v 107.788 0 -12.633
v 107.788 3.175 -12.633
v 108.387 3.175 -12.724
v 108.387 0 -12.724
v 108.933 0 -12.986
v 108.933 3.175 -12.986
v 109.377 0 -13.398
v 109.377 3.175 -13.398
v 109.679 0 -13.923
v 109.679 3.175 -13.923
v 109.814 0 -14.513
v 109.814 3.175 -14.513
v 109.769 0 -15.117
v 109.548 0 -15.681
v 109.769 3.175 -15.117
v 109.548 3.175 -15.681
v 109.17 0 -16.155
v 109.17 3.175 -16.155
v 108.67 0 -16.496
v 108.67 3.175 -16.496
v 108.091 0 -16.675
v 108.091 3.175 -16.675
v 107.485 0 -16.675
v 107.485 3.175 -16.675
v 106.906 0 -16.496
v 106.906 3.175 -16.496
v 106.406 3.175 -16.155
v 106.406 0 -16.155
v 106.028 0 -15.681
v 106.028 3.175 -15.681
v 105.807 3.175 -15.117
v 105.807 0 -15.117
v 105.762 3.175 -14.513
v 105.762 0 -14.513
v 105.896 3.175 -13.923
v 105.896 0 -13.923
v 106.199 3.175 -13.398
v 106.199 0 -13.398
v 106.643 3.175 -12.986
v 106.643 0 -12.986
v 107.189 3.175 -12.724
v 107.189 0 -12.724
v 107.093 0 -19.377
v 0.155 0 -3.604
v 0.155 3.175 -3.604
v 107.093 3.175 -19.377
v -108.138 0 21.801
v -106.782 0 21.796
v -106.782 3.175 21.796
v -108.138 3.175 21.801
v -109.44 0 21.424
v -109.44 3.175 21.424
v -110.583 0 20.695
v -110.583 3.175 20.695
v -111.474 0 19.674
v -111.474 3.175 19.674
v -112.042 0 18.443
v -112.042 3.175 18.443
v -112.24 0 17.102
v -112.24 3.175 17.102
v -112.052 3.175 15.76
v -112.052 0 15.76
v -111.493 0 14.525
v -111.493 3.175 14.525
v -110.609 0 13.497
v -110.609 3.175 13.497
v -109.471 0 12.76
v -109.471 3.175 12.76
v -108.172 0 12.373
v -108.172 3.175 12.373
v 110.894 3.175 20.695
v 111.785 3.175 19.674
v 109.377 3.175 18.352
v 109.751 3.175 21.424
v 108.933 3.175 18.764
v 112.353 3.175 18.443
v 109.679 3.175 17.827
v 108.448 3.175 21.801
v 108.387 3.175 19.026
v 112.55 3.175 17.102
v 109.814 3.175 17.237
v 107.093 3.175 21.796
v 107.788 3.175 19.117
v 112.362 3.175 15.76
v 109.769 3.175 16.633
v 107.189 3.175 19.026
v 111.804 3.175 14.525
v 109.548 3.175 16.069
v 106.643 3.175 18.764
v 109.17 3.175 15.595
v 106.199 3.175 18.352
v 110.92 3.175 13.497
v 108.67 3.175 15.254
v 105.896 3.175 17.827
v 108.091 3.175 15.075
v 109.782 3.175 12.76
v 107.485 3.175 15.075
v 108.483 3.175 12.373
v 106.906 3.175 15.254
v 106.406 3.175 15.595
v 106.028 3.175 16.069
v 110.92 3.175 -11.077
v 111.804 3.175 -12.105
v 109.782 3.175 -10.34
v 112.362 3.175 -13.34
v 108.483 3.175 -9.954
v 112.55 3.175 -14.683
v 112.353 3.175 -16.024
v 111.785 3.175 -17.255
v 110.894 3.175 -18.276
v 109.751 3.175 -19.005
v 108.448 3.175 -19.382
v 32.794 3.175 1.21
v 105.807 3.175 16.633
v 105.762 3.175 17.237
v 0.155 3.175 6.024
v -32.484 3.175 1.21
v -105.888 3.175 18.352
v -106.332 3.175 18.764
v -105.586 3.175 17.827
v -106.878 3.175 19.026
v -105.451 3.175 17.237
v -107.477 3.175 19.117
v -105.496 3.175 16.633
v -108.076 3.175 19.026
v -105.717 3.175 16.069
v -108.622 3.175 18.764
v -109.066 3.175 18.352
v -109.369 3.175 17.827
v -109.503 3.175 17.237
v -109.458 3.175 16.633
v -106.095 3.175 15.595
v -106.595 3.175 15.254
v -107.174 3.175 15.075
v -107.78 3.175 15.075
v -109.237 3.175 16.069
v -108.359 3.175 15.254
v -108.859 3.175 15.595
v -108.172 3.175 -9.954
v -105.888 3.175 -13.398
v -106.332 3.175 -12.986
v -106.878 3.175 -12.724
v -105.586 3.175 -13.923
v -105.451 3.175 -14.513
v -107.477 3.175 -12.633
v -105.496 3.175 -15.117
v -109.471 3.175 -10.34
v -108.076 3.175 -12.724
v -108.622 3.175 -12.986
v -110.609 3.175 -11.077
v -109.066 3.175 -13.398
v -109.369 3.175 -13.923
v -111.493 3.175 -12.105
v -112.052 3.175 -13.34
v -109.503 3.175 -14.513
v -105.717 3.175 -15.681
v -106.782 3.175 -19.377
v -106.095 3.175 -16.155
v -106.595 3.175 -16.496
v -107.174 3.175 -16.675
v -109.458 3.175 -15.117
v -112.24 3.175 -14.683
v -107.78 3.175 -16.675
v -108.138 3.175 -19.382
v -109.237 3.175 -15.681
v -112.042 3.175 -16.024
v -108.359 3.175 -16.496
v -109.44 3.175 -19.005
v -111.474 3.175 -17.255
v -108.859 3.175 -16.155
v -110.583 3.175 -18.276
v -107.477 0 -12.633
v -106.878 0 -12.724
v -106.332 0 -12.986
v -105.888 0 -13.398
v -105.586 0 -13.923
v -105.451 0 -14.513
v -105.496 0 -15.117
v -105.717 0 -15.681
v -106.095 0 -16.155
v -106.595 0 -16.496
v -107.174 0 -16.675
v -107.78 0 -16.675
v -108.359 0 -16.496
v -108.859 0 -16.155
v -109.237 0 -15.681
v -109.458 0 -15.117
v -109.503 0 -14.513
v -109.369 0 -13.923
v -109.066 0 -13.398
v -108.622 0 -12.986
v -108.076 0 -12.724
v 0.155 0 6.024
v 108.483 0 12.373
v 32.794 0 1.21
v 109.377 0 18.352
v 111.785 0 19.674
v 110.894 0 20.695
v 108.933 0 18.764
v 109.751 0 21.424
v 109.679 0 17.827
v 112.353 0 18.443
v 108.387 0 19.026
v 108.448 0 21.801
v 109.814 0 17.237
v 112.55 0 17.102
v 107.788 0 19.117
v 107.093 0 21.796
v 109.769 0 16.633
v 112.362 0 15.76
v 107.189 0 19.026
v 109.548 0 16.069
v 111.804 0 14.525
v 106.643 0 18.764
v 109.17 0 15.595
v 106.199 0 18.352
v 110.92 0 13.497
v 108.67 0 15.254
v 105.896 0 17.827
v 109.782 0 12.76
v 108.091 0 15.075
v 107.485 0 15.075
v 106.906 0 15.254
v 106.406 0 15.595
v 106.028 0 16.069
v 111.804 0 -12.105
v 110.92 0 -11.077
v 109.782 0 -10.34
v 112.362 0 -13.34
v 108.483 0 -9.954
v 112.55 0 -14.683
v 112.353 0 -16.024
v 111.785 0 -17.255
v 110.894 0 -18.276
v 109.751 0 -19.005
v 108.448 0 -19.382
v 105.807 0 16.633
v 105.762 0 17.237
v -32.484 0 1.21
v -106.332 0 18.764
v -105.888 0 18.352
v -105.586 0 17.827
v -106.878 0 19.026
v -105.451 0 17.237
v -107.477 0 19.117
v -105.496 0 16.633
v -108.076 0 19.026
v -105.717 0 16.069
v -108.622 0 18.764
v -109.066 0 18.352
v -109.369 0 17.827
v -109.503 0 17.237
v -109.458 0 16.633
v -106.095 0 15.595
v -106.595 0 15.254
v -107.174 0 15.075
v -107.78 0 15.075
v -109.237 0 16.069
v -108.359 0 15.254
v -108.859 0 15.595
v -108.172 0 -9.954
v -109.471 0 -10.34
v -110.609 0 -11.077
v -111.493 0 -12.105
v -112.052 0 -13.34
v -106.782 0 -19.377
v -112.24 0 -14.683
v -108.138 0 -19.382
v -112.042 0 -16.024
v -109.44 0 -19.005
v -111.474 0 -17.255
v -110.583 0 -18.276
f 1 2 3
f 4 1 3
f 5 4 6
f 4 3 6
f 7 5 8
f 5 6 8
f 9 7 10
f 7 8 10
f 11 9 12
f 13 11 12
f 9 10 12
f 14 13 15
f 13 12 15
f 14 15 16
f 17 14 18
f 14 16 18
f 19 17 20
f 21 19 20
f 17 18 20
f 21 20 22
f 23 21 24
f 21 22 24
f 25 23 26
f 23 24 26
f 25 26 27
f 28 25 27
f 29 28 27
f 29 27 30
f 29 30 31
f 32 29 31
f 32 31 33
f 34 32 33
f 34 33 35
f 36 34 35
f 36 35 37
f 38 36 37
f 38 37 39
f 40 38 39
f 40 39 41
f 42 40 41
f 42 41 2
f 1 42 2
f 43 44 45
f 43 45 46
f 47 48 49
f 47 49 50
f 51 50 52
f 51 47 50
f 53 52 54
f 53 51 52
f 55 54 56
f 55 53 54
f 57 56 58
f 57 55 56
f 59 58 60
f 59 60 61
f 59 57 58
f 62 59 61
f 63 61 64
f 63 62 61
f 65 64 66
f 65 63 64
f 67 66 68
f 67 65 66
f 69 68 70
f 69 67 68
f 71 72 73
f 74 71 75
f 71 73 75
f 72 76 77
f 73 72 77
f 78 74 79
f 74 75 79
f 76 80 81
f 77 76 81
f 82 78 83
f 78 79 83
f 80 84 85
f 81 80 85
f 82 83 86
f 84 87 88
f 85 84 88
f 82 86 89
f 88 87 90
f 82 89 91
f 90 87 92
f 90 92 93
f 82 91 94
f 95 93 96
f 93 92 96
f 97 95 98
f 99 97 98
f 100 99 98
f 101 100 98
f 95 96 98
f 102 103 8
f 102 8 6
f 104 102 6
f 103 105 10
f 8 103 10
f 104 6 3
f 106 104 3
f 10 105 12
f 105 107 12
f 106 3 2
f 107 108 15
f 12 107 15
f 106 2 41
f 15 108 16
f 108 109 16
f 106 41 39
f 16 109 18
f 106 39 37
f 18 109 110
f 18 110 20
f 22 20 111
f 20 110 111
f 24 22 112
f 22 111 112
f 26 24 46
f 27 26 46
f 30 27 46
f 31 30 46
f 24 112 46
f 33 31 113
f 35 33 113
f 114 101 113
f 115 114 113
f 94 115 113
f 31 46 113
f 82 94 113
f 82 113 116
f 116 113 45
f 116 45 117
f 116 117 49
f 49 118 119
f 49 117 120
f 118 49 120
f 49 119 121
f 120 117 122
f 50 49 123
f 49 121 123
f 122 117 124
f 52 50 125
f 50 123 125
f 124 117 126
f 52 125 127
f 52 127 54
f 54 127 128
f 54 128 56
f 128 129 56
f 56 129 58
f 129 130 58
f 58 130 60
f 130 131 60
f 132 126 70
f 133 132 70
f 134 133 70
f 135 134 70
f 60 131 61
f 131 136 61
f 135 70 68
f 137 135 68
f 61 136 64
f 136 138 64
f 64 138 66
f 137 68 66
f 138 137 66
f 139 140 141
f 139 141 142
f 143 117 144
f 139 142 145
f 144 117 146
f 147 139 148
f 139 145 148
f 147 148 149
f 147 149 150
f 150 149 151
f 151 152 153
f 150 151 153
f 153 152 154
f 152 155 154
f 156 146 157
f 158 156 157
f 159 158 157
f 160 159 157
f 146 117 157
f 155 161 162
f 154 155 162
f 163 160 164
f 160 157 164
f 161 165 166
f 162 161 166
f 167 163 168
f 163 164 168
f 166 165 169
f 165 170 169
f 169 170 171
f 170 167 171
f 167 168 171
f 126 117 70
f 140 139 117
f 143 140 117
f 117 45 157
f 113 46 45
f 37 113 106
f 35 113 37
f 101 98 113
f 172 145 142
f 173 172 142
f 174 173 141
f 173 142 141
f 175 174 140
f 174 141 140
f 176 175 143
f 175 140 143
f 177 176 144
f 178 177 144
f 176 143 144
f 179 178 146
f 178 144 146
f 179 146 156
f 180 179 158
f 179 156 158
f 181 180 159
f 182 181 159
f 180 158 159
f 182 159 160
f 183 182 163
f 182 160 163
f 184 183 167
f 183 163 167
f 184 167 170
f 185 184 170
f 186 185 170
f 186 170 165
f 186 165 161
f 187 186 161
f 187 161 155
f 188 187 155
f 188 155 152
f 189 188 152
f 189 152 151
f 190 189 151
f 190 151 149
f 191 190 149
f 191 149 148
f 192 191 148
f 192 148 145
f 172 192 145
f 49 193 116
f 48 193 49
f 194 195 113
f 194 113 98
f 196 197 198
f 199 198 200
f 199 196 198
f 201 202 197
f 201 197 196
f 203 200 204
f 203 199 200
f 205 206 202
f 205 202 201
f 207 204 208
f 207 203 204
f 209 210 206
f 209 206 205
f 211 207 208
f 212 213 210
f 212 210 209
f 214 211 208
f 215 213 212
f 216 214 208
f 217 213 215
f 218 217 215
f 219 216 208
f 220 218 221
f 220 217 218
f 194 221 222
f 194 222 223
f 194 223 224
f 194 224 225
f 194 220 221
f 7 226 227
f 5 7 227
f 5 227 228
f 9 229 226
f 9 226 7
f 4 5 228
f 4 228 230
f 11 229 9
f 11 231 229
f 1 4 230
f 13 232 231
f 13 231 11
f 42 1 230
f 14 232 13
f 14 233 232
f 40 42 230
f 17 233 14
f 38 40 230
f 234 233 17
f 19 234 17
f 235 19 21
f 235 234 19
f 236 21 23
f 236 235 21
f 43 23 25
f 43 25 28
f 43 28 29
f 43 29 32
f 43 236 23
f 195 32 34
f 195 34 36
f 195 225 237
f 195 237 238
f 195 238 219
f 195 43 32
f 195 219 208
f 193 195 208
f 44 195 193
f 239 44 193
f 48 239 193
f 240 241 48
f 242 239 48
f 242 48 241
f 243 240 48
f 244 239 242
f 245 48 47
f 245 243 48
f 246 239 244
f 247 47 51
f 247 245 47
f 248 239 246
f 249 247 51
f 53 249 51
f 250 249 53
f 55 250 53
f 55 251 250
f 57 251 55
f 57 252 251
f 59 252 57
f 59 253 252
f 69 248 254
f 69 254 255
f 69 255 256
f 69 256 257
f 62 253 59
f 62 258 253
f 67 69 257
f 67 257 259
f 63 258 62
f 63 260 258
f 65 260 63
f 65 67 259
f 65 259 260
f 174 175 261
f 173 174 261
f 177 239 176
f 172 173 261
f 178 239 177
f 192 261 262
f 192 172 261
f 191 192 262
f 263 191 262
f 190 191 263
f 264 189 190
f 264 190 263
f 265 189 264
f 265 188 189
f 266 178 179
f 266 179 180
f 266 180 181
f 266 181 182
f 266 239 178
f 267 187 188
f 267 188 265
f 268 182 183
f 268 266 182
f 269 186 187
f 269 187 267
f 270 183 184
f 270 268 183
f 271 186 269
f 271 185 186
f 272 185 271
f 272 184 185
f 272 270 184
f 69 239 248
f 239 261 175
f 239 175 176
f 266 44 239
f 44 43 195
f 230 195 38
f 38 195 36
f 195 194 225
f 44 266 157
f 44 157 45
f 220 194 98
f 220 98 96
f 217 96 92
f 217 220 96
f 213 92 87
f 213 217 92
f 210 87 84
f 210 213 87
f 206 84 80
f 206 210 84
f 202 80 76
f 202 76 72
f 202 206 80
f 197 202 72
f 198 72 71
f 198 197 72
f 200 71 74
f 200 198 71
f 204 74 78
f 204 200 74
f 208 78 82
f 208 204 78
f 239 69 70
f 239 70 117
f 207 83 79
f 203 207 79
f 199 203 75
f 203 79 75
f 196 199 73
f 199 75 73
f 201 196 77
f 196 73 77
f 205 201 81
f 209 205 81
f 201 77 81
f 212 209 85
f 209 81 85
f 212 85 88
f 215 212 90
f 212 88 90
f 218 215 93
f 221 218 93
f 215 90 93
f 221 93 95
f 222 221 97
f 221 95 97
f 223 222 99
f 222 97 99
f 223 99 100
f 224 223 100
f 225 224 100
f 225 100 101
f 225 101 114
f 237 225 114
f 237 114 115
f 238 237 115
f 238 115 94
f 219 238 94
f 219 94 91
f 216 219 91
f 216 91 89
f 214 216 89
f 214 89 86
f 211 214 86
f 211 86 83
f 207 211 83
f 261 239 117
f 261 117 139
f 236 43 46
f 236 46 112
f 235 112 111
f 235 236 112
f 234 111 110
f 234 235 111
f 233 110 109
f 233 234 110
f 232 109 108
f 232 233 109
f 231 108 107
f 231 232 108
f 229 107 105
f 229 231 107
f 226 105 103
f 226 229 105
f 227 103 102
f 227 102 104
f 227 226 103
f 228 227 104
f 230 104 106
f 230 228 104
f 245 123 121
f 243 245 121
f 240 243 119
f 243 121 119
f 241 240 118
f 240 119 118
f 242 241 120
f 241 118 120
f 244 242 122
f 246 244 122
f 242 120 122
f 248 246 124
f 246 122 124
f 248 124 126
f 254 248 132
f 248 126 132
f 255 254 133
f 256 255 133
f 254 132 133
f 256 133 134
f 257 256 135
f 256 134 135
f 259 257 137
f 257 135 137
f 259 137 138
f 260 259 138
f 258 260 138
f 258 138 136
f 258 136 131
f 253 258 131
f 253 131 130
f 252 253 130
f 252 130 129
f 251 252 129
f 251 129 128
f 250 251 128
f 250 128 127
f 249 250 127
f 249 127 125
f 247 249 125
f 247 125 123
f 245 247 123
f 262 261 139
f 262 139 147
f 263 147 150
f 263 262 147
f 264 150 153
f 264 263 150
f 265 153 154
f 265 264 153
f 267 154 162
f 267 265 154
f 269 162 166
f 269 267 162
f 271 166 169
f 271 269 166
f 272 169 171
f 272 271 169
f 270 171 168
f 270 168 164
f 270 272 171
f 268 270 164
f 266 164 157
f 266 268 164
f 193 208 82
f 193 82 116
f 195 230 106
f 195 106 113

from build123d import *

# Parameters (mm, degrees)
BOSS_EXTRUDE1_DEPTH = 3.175
SKETCH2_R           = 2.032
CUT_EXTRUDE1_DEPTH  = 115.695104393


with BuildPart() as part:
    # Sketch1 → Boss-Extrude1 (new body)
    with BuildSketch(Plane(origin=(0, 0, 0), x_dir=(1, 0, 0), z_dir=(0, 1, 0))):
        with BuildLine():
            Line((-108.172056186, -12.373235341), (-32.483719252, -1.209763817))
            Line((-32.483719252, -1.209763817), (-108.172056172, 9.953707462))
            ThreePointArc((-108.172056172, 9.953707462), (-112.188668788, 15.360151236), (-106.782225129, 19.376764008))
            Line((-106.782225129, 19.376764008), (0.155358302, 3.604259421))
            Line((0.155358302, 3.604259421), (107.092941684, 19.376764345))
            ThreePointArc((107.092941684, 19.376764345), (112.499387579, 15.360153144), (108.482775156, 9.953708157))
            Line((108.482775156, 9.953708157), (32.794435872, -1.209763714))
            Line((32.794435872, -1.209763714), (108.482775141, -12.373235339))
            ThreePointArc((108.482775141, -12.373235339), (112.499387585, -17.779680288), (107.092941749, -21.796291538))
            Line((107.092941749, -21.796291538), (0.155358318, -6.023786952))
            Line((0.155358318, -6.023786952), (-106.782225064, -21.796291875))
            ThreePointArc((-106.782225064, -21.796291875), (-112.188668782, -17.779679153), (-108.172056186, -12.373235341))
        make_face()
    extrude(amount=BOSS_EXTRUDE1_DEPTH)

    # Sketch2 → Cut-Extrude1 (cut, through all)
    with BuildSketch(Plane(origin=(0, 3.175, 0), x_dir=(1, 0, 0), z_dir=(0, 1, 0))):
        with Locations(Location((-107.477140515, 14.665235715, 0), (0, 0, 270))):
            Circle(SKETCH2_R)
        with Locations(Location((-107.477140515, -17.084763592, 0), (0, 0, 270))):
            Circle(SKETCH2_R)
        with Locations(Location((107.787859485, 14.665236408, 0), (0, 0, 270))):
            Circle(SKETCH2_R)
        with Locations(Location((107.787859485, -17.084763592, 0), (0, 0, 270))):
            Circle(SKETCH2_R)
    extrude(amount=-CUT_EXTRUDE1_DEPTH, mode=Mode.SUBTRACT)


solid = part.part
